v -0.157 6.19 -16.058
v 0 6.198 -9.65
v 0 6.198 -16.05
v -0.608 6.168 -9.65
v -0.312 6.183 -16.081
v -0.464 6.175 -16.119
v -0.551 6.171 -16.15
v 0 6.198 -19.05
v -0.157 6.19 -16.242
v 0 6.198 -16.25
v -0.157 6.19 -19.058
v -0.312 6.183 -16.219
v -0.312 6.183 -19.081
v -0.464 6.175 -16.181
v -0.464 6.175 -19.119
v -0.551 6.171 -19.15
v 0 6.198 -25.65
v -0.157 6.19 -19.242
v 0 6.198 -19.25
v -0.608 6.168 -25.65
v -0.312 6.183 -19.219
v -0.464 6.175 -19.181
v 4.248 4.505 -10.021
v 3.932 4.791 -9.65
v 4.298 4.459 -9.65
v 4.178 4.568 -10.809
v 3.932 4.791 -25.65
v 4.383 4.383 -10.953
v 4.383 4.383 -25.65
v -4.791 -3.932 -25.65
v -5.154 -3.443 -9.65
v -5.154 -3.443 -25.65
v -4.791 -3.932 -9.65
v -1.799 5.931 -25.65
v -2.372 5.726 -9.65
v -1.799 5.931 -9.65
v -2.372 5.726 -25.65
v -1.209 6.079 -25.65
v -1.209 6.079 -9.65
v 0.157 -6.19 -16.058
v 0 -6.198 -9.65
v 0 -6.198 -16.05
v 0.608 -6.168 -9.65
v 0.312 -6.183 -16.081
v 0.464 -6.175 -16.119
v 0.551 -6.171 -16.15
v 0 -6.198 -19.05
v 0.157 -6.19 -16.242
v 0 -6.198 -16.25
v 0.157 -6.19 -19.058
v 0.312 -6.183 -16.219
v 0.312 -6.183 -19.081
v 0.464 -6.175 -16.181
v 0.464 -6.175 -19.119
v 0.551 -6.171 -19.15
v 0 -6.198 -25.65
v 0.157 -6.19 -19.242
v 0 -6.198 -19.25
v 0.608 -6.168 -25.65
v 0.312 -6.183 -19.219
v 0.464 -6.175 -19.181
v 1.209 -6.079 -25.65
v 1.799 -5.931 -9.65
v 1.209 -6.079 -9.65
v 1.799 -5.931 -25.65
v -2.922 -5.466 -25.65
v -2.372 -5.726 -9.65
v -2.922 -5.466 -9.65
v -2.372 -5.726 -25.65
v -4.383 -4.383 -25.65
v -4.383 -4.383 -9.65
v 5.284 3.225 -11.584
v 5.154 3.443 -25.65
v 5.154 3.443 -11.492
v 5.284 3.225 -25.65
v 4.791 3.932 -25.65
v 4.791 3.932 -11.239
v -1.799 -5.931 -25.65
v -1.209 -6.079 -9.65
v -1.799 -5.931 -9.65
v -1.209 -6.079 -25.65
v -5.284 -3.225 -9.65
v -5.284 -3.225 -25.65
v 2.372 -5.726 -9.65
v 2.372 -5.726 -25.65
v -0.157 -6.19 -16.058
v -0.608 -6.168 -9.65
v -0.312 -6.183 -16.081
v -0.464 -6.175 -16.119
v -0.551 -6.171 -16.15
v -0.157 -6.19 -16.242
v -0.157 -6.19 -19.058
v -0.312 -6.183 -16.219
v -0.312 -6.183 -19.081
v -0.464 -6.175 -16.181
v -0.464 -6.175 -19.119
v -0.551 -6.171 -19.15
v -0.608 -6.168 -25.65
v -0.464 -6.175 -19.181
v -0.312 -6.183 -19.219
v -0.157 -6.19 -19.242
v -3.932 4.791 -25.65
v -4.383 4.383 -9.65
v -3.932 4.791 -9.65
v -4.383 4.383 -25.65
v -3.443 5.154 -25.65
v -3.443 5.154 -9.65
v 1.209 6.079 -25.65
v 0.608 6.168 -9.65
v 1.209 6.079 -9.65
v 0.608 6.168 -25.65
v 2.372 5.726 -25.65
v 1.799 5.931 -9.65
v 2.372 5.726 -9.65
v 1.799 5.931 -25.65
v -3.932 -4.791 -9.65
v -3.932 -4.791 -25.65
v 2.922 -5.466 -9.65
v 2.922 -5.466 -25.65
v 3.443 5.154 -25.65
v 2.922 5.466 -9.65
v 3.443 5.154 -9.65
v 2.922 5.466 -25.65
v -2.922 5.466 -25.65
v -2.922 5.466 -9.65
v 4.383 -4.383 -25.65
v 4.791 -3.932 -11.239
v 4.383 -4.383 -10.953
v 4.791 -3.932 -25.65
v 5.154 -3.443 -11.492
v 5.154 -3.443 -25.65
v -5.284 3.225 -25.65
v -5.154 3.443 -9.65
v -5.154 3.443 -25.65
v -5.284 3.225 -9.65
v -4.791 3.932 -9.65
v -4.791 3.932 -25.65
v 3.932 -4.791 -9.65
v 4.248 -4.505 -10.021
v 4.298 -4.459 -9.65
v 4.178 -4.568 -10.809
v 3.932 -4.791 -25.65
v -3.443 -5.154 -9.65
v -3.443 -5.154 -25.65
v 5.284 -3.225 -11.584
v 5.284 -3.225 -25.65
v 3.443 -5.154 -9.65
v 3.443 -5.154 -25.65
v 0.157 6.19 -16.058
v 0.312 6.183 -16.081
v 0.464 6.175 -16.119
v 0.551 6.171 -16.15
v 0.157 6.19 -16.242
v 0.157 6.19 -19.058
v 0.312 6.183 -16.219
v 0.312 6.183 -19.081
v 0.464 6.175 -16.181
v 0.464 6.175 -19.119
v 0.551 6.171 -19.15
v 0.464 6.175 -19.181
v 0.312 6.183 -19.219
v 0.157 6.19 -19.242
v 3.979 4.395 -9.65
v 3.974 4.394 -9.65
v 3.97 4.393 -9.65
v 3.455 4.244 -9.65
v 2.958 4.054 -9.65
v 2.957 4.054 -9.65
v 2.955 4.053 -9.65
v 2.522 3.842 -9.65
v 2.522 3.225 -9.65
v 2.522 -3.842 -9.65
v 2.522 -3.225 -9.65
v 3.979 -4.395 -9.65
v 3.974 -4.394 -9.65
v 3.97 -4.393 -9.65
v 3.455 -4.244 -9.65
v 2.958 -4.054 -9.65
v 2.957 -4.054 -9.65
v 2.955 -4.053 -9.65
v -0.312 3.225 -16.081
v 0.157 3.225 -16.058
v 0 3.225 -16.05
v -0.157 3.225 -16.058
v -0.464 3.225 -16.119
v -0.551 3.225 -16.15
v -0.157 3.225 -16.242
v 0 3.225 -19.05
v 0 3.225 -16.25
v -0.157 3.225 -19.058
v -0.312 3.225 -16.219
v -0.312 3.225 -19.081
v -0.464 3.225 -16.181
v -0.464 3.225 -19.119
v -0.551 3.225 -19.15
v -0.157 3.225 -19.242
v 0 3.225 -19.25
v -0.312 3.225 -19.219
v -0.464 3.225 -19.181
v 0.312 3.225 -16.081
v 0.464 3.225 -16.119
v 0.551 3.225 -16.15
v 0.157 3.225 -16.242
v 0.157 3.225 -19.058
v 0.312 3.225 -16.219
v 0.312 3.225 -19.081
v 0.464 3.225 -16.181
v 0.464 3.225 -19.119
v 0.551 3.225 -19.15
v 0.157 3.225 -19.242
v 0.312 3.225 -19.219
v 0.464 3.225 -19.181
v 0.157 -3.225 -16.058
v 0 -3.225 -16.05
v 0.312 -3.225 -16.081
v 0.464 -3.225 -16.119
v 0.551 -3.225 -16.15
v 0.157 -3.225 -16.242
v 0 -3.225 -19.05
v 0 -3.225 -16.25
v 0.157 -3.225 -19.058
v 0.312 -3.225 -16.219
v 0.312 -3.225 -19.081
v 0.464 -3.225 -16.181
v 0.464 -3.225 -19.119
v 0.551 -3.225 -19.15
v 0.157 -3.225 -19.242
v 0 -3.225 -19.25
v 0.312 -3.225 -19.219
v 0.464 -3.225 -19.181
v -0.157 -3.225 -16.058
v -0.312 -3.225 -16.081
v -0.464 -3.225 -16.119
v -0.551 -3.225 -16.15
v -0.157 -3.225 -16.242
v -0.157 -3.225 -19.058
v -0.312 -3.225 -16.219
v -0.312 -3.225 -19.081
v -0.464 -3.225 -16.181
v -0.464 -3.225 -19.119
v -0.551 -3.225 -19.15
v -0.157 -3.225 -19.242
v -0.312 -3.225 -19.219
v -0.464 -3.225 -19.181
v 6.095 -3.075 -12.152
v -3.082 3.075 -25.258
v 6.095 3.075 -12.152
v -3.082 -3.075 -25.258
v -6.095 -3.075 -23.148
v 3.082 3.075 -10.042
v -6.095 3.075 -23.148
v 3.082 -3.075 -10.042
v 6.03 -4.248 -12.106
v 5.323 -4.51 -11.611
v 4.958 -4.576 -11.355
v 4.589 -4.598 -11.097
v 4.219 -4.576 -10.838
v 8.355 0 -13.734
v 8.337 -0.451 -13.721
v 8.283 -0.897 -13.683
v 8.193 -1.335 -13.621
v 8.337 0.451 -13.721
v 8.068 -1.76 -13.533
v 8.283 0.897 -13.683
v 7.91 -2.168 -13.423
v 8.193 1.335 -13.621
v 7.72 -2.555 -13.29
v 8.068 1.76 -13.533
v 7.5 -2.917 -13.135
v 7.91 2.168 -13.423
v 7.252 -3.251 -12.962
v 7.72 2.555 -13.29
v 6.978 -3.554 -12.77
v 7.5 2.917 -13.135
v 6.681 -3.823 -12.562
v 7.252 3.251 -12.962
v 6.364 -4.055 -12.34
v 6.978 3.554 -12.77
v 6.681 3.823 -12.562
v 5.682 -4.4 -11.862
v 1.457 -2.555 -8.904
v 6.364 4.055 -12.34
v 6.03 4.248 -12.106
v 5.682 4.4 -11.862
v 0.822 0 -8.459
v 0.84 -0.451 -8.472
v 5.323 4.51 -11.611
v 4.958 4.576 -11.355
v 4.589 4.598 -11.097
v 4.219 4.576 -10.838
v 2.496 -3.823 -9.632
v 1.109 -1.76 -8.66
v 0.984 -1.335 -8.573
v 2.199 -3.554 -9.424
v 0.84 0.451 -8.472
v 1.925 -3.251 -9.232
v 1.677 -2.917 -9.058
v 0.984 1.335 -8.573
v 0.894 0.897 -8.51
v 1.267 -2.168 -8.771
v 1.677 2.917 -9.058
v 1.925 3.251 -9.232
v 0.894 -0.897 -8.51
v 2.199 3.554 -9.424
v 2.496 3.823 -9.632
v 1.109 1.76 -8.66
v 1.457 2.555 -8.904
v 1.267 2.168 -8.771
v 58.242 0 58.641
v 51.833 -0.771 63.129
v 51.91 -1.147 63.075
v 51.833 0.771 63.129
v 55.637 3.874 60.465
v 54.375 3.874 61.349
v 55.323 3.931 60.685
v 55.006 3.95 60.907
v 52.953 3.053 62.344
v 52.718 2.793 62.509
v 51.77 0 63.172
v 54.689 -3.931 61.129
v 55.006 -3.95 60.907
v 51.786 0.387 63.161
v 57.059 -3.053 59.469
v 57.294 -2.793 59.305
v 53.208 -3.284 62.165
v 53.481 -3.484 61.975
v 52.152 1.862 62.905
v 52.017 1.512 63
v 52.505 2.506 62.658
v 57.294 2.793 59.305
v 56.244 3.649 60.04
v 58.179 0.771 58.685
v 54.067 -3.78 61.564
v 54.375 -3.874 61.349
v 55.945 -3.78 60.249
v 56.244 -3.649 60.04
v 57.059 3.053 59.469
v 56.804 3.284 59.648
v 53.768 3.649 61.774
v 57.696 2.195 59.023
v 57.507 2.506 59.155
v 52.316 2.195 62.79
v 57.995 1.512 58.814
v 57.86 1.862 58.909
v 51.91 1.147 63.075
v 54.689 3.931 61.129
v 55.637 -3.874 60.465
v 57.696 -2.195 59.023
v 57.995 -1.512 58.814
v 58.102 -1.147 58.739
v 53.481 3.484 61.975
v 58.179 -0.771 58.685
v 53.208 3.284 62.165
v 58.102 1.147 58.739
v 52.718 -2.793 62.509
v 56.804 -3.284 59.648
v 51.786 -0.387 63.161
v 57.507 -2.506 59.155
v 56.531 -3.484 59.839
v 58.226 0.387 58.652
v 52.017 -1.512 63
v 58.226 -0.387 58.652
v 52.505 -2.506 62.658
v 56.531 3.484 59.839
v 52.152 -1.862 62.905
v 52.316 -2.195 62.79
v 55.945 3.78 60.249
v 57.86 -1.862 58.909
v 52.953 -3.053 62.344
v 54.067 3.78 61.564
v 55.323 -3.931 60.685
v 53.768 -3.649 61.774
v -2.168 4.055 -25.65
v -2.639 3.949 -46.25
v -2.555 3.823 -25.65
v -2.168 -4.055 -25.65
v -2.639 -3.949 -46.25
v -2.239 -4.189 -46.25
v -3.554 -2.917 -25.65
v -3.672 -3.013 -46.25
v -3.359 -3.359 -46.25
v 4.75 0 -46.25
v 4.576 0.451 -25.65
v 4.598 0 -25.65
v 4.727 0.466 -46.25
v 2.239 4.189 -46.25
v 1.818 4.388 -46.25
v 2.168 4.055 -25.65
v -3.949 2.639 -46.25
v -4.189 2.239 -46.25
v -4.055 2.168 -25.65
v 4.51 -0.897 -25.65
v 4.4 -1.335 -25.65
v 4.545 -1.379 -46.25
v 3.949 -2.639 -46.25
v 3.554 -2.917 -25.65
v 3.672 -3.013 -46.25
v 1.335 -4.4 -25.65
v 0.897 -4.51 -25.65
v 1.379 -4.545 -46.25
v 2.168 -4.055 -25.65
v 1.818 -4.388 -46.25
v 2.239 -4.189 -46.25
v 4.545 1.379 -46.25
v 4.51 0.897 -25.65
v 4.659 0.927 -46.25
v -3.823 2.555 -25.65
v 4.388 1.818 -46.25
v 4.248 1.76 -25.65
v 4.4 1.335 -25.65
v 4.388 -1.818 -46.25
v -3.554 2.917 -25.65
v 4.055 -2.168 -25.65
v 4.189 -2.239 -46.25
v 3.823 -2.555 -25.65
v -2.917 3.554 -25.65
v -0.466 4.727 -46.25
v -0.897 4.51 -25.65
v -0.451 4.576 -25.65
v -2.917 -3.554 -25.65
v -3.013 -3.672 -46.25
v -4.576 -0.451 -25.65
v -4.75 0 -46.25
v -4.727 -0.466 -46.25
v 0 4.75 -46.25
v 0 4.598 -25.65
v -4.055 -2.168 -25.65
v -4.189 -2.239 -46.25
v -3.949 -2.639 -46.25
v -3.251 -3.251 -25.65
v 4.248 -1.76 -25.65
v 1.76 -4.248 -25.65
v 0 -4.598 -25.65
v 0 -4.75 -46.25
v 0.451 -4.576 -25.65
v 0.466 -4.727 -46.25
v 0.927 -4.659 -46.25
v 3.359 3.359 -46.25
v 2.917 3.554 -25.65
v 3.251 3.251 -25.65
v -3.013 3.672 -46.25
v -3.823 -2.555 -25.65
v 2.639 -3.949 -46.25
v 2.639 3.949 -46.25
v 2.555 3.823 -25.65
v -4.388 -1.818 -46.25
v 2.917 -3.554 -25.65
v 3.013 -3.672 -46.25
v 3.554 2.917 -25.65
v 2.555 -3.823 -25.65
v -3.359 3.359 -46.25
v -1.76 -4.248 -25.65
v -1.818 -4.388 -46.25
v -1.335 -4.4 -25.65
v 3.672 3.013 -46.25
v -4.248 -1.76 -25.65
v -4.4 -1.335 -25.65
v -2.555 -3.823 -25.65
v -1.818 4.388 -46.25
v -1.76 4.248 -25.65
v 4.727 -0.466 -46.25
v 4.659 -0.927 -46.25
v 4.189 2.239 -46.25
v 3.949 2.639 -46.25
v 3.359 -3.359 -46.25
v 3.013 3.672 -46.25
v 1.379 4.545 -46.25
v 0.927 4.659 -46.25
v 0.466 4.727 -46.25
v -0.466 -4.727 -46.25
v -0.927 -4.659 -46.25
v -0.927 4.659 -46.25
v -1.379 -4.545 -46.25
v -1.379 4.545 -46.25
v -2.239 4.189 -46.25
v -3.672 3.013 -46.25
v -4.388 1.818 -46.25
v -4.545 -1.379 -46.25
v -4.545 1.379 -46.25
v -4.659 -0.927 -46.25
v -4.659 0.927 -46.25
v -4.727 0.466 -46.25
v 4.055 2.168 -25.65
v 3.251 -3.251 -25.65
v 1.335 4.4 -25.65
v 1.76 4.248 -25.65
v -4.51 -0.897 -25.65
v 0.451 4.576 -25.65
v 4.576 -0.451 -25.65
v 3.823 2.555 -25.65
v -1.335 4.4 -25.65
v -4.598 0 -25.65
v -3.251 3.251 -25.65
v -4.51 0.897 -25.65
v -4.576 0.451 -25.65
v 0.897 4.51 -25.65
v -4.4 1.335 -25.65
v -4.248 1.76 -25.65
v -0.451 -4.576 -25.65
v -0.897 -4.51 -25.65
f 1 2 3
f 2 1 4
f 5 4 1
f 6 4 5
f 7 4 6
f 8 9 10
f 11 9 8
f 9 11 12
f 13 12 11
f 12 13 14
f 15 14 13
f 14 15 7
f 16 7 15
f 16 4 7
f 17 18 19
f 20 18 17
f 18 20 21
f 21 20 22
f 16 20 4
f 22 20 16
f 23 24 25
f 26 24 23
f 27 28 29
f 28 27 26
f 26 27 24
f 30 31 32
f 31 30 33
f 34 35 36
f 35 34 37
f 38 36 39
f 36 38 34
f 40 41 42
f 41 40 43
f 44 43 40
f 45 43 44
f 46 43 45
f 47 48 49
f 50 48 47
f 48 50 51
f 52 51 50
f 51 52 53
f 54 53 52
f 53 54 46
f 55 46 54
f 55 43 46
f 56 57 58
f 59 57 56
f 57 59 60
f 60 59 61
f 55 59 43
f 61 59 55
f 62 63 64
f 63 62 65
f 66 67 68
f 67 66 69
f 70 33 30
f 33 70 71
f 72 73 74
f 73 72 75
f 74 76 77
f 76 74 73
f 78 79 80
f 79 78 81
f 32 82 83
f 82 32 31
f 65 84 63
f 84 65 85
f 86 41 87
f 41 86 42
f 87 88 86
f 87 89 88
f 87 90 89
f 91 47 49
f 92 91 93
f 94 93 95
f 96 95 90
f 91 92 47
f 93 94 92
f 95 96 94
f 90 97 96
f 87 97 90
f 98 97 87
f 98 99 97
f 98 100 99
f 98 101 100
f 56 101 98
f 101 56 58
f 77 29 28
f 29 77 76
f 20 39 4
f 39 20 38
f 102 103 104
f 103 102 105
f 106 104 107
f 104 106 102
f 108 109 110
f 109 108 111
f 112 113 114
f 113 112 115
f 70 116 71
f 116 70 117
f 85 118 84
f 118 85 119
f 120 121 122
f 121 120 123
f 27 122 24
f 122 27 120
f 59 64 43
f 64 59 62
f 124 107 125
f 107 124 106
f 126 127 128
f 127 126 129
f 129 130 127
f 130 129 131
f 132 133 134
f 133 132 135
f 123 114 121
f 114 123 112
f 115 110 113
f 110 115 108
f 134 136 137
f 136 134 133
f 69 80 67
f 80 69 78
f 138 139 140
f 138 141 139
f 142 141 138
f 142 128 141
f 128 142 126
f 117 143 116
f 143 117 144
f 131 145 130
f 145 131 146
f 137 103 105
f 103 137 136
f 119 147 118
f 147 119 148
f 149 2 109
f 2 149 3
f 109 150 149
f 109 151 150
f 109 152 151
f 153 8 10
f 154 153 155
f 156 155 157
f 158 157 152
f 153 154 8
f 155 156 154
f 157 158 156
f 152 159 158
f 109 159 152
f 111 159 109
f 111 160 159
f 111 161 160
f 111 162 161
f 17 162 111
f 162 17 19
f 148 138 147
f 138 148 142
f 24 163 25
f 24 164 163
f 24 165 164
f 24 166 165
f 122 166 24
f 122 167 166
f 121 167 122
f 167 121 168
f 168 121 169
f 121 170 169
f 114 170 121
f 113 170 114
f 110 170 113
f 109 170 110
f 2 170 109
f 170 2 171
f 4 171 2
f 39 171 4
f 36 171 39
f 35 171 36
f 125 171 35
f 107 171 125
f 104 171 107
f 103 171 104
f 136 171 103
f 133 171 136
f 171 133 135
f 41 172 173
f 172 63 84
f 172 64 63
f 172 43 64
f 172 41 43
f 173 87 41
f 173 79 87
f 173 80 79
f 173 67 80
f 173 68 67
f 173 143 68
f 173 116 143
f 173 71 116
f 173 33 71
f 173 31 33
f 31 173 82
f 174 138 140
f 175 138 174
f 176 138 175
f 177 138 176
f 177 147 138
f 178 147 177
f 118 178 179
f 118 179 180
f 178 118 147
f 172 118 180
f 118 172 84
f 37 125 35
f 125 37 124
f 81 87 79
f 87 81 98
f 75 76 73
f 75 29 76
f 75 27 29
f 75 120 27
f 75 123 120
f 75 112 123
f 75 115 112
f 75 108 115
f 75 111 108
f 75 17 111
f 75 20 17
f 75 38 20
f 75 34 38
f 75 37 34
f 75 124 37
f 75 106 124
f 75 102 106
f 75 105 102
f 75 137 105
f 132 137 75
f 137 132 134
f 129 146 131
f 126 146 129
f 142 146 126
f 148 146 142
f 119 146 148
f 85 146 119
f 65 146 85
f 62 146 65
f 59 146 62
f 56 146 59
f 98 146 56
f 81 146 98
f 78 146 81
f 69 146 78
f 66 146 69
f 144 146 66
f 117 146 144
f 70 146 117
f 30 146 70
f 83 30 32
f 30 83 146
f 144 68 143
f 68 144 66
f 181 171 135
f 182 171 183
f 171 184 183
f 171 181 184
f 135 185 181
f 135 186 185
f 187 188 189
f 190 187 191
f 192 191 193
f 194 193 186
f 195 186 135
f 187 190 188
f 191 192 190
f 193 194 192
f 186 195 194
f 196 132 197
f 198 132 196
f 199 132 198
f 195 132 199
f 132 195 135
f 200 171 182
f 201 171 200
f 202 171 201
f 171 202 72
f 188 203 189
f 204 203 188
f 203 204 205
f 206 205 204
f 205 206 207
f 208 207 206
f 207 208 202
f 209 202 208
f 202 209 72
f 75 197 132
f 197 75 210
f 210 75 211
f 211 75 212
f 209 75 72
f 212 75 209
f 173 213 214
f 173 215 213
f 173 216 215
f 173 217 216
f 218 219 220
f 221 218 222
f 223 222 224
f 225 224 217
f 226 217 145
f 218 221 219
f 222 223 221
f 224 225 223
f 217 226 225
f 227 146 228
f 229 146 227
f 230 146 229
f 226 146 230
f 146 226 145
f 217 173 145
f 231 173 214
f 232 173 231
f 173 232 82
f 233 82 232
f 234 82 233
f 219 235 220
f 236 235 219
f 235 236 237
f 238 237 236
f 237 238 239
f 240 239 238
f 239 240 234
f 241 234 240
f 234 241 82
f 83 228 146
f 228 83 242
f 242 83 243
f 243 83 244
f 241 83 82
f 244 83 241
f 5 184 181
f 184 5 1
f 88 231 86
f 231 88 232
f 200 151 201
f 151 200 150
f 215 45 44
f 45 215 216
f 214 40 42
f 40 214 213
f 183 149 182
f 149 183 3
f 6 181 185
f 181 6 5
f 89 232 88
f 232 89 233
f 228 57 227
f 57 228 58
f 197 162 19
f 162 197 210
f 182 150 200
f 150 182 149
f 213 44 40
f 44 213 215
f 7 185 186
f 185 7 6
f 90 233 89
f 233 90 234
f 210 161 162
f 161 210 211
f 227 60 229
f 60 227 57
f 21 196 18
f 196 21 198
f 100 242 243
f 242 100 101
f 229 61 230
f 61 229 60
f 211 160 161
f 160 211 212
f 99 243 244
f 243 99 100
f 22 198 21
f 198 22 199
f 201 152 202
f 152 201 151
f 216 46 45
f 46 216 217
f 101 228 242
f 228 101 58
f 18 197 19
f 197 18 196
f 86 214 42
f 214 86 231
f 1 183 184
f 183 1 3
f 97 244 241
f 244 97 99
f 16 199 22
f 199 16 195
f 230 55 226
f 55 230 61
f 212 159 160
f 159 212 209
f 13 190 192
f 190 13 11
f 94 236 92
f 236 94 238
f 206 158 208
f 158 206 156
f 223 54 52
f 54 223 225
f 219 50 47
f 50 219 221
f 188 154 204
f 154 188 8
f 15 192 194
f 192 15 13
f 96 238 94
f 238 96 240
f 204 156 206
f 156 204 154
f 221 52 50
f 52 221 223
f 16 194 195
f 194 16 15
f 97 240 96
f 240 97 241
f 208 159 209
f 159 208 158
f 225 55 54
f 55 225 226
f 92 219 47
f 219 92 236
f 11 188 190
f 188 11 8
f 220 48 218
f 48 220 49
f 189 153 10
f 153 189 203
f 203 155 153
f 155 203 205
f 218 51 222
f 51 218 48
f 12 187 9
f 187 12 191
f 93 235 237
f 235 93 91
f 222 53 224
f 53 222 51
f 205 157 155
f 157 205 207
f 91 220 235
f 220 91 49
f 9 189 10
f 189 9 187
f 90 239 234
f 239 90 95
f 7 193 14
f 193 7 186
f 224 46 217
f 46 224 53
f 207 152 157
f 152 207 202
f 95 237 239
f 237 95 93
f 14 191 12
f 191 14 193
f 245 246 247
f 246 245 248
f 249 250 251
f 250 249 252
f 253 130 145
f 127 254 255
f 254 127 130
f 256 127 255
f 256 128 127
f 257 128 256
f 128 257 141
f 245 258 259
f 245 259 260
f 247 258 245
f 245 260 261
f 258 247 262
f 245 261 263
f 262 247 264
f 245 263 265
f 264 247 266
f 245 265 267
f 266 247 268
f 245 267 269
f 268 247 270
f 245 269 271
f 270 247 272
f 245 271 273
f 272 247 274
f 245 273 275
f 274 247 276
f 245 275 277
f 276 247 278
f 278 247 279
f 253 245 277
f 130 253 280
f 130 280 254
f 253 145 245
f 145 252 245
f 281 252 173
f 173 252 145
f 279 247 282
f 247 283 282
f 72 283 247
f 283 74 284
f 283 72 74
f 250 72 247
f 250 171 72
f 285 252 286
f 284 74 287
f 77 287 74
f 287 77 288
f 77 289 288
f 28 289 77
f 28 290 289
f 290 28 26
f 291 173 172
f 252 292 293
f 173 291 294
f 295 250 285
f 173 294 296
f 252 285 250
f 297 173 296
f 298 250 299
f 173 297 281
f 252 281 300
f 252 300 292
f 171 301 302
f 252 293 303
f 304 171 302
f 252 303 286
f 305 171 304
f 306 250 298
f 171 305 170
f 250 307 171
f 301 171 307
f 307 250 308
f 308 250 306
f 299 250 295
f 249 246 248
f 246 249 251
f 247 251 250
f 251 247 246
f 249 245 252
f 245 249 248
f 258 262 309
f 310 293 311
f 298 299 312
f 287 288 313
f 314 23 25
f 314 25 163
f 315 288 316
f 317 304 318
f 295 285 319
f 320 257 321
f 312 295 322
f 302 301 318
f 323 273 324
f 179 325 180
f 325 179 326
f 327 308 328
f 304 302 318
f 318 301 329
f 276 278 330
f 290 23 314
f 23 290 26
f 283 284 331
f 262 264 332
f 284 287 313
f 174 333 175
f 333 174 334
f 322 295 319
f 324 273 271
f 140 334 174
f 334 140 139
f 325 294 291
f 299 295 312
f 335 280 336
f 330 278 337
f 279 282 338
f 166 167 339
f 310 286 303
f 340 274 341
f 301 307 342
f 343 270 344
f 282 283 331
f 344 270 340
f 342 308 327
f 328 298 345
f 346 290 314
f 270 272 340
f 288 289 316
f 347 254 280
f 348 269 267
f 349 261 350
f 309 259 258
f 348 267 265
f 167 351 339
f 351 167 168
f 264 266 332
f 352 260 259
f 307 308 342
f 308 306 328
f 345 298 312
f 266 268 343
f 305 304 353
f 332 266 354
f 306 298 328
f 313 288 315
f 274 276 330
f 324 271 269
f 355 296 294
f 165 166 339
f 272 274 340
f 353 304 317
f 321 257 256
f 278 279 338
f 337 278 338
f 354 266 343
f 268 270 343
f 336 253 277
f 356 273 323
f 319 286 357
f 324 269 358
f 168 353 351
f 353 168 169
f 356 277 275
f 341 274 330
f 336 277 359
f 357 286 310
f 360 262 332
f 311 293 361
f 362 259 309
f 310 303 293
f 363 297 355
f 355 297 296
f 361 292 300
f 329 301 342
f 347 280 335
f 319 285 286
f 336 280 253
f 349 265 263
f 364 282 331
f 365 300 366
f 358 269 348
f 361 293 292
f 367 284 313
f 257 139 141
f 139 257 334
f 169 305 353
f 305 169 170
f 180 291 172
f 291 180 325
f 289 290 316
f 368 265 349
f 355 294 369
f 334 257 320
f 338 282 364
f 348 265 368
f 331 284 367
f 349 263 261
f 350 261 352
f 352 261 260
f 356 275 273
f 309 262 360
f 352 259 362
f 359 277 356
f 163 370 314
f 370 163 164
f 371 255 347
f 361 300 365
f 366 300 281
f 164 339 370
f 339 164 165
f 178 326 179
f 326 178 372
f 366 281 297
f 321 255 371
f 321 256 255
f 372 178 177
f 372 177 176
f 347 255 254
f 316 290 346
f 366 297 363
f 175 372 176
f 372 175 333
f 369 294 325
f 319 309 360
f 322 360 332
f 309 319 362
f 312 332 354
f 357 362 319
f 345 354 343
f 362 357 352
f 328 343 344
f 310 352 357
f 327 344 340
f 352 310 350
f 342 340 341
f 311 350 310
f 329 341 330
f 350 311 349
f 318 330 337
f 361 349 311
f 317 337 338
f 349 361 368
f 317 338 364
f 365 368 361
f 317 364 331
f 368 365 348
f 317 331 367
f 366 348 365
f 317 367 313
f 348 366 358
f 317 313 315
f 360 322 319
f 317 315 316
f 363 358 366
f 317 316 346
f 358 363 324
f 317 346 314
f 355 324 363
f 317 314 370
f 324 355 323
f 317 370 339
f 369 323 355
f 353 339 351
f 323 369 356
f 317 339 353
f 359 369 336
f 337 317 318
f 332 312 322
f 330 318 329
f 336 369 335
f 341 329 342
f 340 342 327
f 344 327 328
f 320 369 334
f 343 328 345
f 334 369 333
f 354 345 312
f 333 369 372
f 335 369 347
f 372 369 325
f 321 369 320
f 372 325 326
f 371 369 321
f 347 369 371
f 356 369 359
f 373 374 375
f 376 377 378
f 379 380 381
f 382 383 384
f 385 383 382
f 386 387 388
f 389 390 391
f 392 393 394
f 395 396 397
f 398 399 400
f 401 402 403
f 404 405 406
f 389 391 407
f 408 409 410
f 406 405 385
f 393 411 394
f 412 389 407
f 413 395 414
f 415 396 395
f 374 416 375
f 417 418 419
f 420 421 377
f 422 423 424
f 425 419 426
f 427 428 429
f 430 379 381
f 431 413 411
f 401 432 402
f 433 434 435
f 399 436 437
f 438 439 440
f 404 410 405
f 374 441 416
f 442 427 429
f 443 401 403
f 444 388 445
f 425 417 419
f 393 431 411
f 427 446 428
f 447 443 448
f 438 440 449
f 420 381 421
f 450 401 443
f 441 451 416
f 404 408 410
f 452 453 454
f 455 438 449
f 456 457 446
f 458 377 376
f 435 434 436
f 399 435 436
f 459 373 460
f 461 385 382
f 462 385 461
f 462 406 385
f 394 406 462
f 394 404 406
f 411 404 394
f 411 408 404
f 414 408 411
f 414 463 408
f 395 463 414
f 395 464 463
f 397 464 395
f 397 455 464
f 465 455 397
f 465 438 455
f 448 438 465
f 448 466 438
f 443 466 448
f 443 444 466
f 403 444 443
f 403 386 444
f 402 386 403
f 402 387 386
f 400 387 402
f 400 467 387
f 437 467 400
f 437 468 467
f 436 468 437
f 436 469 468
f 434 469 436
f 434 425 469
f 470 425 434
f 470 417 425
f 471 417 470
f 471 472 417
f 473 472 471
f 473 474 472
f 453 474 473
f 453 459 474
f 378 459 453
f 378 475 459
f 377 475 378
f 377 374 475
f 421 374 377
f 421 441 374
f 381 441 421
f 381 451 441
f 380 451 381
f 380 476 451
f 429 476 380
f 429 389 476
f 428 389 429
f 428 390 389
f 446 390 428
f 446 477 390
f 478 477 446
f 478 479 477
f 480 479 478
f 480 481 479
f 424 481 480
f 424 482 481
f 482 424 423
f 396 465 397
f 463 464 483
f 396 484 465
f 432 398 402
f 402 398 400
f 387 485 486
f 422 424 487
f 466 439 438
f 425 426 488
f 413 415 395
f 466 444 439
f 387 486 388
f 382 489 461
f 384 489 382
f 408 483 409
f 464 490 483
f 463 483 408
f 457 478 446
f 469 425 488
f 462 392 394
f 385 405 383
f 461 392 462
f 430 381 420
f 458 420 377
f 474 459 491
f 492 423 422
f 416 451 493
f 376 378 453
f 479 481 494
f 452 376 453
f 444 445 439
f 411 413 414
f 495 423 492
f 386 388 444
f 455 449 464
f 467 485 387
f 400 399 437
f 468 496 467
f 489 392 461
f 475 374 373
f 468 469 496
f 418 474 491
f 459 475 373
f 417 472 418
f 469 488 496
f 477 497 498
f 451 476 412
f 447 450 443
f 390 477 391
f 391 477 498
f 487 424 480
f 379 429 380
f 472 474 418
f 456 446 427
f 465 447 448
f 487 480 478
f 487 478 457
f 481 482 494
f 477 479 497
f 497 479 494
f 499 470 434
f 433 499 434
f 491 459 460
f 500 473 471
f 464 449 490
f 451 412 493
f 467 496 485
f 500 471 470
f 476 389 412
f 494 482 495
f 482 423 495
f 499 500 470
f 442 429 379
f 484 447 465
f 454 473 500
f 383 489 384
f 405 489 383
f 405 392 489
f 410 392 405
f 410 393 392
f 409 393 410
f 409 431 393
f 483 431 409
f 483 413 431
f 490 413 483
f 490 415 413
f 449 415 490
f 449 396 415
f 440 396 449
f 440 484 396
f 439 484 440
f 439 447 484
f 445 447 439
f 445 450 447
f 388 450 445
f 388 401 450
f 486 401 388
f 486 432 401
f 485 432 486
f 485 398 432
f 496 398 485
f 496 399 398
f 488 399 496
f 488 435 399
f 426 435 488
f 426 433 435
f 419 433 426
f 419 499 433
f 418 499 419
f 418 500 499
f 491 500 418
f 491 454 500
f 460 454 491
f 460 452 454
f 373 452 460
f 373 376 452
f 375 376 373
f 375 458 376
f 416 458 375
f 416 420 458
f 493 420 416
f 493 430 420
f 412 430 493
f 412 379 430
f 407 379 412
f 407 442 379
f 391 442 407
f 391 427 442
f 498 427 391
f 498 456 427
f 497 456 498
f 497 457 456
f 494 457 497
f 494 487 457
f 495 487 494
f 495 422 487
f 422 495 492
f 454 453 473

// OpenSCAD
$fn = 64;

total_len = 108.5;
base_d = 9.5;
tip_d = 7.9;

fixed_len = 20.6;
pivot_from_base = 20.6;

panel_gap = 6.45;

hinge_clearance = 0.3;        // clearance between hinge parts
hinge_wall = 1.6;             // thickness around hinge bore
hinge_bore_d = 3.2;           // pivot pin hole diameter
knuckle_len = 6.0;            // length of each knuckle along axis
knuckle_end_margin = 2.0;     // spacing from hinge ends to knuckles

fold_angle = 35;              // folded angle for demonstration

function lerp(a,b,t) = a + (b-a)*t;

module whip_shaft(len, d0, d1) {
    cylinder(h=len, d1=d0, d2=d1);
}

module hinge_female(r_out, bore_d, gap, len) {
    // Outer body
    difference() {
        translate([0,0,0])
            cylinder(h=len, r=r_out);
        // Split slot for male blade (panel gap)
        translate([-r_out, -gap/2, -1])
            cube([2*r_out, gap, len+2], center=false);
        // Pivot bore (across Y axis)
        translate([0,0,len/2])
            rotate([90,0,0])
                cylinder(h=2*r_out+2, d=bore_d, center=true);
    }
    // Add two knuckles (top and bottom) leaving middle open
    kn_z1 = knuckle_end_margin;
    kn_z2 = len - knuckle_end_margin - knuckle_len;
    for (zpos=[kn_z1, kn_z2]) {
        difference() {
            translate([0,0,zpos])
                cylinder(h=knuckle_len, r=r_out);
            translate([-r_out, -gap/2, zpos-1])
                cube([2*r_out, gap, knuckle_len+2], center=false);
            translate([0,0,zpos+knuckle_len/2])
                rotate([90,0,0])
                    cylinder(h=2*r_out+2, d=bore_d, center=true);
        }
    }
}

module hinge_male(blade_w, blade_t, bore_d, len) {
    // A blade that fits into the female gap, with single central knuckle
    union() {
        // Blade body
        translate([-blade_t/2, -blade_w/2, 0])
            cube([blade_t, blade_w, len], center=false);

        // Central knuckle around bore
        difference() {
            translate([0,0,(len-knuckle_len)/2])
                cylinder(h=knuckle_len, d=blade_w);
            translate([0,0,len/2])
                rotate([90,0,0])
                    cylinder(h=blade_w+2, d=bore_d, center=true);
            // remove anything outside blade thickness to keep it blade-like
            translate([blade_t/2, -blade_w, -1])
                cube([blade_w, 2*blade_w, len+2], center=false);
            translate([-blade_w - blade_t/2, -blade_w, -1])
                cube([blade_w, 2*blade_w, len+2], center=false);
        }
    }
}

module folding_whip_antenna() {
    remaining_len = total_len - fixed_len;
    r0 = base_d/2;
    r1 = tip_d/2;

    // Compute diameter at pivot for smooth taper
    d_pivot = lerp(base_d, tip_d, pivot_from_base/total_len);
    r_pivot = d_pivot/2;

    // Hinge geometry derived from sizes and gap
    female_r_out = max(r_pivot + hinge_wall, (panel_gap/2) + hinge_wall);
    male_blade_w = panel_gap - hinge_clearance;
    male_blade_t = max(3.2, r_pivot*0.8); // thickness of blade
    hinge_len = 16.0;

    // Fixed straight section (from base to pivot)
    union() {
        // Fixed tapered shaft up to pivot
        whip_shaft(fixed_len, base_d, d_pivot);

        // Female hinge attached at pivot end
        translate([0,0,fixed_len])
            hinge_female(female_r_out, hinge_bore_d, panel_gap, hinge_len);

        // Male hinge + folding whip section (folded for visualization)
        translate([0,0,fixed_len + hinge_len/2])
            rotate([0, fold_angle, 0])
                translate([0,0,-hinge_len/2])  // pivot about bore center
                    union() {
                        // Male hinge blade
                        hinge_male(male_blade_w, male_blade_t, hinge_bore_d, hinge_len);

                        // Continuation shaft from hinge outward
                        translate([0,0,hinge_len])
                            whip_shaft(remaining_len, d_pivot, tip_d);
                    }
    }
}

translate([0,0,-total_len/2 + 8]) folding_whip_antenna();
